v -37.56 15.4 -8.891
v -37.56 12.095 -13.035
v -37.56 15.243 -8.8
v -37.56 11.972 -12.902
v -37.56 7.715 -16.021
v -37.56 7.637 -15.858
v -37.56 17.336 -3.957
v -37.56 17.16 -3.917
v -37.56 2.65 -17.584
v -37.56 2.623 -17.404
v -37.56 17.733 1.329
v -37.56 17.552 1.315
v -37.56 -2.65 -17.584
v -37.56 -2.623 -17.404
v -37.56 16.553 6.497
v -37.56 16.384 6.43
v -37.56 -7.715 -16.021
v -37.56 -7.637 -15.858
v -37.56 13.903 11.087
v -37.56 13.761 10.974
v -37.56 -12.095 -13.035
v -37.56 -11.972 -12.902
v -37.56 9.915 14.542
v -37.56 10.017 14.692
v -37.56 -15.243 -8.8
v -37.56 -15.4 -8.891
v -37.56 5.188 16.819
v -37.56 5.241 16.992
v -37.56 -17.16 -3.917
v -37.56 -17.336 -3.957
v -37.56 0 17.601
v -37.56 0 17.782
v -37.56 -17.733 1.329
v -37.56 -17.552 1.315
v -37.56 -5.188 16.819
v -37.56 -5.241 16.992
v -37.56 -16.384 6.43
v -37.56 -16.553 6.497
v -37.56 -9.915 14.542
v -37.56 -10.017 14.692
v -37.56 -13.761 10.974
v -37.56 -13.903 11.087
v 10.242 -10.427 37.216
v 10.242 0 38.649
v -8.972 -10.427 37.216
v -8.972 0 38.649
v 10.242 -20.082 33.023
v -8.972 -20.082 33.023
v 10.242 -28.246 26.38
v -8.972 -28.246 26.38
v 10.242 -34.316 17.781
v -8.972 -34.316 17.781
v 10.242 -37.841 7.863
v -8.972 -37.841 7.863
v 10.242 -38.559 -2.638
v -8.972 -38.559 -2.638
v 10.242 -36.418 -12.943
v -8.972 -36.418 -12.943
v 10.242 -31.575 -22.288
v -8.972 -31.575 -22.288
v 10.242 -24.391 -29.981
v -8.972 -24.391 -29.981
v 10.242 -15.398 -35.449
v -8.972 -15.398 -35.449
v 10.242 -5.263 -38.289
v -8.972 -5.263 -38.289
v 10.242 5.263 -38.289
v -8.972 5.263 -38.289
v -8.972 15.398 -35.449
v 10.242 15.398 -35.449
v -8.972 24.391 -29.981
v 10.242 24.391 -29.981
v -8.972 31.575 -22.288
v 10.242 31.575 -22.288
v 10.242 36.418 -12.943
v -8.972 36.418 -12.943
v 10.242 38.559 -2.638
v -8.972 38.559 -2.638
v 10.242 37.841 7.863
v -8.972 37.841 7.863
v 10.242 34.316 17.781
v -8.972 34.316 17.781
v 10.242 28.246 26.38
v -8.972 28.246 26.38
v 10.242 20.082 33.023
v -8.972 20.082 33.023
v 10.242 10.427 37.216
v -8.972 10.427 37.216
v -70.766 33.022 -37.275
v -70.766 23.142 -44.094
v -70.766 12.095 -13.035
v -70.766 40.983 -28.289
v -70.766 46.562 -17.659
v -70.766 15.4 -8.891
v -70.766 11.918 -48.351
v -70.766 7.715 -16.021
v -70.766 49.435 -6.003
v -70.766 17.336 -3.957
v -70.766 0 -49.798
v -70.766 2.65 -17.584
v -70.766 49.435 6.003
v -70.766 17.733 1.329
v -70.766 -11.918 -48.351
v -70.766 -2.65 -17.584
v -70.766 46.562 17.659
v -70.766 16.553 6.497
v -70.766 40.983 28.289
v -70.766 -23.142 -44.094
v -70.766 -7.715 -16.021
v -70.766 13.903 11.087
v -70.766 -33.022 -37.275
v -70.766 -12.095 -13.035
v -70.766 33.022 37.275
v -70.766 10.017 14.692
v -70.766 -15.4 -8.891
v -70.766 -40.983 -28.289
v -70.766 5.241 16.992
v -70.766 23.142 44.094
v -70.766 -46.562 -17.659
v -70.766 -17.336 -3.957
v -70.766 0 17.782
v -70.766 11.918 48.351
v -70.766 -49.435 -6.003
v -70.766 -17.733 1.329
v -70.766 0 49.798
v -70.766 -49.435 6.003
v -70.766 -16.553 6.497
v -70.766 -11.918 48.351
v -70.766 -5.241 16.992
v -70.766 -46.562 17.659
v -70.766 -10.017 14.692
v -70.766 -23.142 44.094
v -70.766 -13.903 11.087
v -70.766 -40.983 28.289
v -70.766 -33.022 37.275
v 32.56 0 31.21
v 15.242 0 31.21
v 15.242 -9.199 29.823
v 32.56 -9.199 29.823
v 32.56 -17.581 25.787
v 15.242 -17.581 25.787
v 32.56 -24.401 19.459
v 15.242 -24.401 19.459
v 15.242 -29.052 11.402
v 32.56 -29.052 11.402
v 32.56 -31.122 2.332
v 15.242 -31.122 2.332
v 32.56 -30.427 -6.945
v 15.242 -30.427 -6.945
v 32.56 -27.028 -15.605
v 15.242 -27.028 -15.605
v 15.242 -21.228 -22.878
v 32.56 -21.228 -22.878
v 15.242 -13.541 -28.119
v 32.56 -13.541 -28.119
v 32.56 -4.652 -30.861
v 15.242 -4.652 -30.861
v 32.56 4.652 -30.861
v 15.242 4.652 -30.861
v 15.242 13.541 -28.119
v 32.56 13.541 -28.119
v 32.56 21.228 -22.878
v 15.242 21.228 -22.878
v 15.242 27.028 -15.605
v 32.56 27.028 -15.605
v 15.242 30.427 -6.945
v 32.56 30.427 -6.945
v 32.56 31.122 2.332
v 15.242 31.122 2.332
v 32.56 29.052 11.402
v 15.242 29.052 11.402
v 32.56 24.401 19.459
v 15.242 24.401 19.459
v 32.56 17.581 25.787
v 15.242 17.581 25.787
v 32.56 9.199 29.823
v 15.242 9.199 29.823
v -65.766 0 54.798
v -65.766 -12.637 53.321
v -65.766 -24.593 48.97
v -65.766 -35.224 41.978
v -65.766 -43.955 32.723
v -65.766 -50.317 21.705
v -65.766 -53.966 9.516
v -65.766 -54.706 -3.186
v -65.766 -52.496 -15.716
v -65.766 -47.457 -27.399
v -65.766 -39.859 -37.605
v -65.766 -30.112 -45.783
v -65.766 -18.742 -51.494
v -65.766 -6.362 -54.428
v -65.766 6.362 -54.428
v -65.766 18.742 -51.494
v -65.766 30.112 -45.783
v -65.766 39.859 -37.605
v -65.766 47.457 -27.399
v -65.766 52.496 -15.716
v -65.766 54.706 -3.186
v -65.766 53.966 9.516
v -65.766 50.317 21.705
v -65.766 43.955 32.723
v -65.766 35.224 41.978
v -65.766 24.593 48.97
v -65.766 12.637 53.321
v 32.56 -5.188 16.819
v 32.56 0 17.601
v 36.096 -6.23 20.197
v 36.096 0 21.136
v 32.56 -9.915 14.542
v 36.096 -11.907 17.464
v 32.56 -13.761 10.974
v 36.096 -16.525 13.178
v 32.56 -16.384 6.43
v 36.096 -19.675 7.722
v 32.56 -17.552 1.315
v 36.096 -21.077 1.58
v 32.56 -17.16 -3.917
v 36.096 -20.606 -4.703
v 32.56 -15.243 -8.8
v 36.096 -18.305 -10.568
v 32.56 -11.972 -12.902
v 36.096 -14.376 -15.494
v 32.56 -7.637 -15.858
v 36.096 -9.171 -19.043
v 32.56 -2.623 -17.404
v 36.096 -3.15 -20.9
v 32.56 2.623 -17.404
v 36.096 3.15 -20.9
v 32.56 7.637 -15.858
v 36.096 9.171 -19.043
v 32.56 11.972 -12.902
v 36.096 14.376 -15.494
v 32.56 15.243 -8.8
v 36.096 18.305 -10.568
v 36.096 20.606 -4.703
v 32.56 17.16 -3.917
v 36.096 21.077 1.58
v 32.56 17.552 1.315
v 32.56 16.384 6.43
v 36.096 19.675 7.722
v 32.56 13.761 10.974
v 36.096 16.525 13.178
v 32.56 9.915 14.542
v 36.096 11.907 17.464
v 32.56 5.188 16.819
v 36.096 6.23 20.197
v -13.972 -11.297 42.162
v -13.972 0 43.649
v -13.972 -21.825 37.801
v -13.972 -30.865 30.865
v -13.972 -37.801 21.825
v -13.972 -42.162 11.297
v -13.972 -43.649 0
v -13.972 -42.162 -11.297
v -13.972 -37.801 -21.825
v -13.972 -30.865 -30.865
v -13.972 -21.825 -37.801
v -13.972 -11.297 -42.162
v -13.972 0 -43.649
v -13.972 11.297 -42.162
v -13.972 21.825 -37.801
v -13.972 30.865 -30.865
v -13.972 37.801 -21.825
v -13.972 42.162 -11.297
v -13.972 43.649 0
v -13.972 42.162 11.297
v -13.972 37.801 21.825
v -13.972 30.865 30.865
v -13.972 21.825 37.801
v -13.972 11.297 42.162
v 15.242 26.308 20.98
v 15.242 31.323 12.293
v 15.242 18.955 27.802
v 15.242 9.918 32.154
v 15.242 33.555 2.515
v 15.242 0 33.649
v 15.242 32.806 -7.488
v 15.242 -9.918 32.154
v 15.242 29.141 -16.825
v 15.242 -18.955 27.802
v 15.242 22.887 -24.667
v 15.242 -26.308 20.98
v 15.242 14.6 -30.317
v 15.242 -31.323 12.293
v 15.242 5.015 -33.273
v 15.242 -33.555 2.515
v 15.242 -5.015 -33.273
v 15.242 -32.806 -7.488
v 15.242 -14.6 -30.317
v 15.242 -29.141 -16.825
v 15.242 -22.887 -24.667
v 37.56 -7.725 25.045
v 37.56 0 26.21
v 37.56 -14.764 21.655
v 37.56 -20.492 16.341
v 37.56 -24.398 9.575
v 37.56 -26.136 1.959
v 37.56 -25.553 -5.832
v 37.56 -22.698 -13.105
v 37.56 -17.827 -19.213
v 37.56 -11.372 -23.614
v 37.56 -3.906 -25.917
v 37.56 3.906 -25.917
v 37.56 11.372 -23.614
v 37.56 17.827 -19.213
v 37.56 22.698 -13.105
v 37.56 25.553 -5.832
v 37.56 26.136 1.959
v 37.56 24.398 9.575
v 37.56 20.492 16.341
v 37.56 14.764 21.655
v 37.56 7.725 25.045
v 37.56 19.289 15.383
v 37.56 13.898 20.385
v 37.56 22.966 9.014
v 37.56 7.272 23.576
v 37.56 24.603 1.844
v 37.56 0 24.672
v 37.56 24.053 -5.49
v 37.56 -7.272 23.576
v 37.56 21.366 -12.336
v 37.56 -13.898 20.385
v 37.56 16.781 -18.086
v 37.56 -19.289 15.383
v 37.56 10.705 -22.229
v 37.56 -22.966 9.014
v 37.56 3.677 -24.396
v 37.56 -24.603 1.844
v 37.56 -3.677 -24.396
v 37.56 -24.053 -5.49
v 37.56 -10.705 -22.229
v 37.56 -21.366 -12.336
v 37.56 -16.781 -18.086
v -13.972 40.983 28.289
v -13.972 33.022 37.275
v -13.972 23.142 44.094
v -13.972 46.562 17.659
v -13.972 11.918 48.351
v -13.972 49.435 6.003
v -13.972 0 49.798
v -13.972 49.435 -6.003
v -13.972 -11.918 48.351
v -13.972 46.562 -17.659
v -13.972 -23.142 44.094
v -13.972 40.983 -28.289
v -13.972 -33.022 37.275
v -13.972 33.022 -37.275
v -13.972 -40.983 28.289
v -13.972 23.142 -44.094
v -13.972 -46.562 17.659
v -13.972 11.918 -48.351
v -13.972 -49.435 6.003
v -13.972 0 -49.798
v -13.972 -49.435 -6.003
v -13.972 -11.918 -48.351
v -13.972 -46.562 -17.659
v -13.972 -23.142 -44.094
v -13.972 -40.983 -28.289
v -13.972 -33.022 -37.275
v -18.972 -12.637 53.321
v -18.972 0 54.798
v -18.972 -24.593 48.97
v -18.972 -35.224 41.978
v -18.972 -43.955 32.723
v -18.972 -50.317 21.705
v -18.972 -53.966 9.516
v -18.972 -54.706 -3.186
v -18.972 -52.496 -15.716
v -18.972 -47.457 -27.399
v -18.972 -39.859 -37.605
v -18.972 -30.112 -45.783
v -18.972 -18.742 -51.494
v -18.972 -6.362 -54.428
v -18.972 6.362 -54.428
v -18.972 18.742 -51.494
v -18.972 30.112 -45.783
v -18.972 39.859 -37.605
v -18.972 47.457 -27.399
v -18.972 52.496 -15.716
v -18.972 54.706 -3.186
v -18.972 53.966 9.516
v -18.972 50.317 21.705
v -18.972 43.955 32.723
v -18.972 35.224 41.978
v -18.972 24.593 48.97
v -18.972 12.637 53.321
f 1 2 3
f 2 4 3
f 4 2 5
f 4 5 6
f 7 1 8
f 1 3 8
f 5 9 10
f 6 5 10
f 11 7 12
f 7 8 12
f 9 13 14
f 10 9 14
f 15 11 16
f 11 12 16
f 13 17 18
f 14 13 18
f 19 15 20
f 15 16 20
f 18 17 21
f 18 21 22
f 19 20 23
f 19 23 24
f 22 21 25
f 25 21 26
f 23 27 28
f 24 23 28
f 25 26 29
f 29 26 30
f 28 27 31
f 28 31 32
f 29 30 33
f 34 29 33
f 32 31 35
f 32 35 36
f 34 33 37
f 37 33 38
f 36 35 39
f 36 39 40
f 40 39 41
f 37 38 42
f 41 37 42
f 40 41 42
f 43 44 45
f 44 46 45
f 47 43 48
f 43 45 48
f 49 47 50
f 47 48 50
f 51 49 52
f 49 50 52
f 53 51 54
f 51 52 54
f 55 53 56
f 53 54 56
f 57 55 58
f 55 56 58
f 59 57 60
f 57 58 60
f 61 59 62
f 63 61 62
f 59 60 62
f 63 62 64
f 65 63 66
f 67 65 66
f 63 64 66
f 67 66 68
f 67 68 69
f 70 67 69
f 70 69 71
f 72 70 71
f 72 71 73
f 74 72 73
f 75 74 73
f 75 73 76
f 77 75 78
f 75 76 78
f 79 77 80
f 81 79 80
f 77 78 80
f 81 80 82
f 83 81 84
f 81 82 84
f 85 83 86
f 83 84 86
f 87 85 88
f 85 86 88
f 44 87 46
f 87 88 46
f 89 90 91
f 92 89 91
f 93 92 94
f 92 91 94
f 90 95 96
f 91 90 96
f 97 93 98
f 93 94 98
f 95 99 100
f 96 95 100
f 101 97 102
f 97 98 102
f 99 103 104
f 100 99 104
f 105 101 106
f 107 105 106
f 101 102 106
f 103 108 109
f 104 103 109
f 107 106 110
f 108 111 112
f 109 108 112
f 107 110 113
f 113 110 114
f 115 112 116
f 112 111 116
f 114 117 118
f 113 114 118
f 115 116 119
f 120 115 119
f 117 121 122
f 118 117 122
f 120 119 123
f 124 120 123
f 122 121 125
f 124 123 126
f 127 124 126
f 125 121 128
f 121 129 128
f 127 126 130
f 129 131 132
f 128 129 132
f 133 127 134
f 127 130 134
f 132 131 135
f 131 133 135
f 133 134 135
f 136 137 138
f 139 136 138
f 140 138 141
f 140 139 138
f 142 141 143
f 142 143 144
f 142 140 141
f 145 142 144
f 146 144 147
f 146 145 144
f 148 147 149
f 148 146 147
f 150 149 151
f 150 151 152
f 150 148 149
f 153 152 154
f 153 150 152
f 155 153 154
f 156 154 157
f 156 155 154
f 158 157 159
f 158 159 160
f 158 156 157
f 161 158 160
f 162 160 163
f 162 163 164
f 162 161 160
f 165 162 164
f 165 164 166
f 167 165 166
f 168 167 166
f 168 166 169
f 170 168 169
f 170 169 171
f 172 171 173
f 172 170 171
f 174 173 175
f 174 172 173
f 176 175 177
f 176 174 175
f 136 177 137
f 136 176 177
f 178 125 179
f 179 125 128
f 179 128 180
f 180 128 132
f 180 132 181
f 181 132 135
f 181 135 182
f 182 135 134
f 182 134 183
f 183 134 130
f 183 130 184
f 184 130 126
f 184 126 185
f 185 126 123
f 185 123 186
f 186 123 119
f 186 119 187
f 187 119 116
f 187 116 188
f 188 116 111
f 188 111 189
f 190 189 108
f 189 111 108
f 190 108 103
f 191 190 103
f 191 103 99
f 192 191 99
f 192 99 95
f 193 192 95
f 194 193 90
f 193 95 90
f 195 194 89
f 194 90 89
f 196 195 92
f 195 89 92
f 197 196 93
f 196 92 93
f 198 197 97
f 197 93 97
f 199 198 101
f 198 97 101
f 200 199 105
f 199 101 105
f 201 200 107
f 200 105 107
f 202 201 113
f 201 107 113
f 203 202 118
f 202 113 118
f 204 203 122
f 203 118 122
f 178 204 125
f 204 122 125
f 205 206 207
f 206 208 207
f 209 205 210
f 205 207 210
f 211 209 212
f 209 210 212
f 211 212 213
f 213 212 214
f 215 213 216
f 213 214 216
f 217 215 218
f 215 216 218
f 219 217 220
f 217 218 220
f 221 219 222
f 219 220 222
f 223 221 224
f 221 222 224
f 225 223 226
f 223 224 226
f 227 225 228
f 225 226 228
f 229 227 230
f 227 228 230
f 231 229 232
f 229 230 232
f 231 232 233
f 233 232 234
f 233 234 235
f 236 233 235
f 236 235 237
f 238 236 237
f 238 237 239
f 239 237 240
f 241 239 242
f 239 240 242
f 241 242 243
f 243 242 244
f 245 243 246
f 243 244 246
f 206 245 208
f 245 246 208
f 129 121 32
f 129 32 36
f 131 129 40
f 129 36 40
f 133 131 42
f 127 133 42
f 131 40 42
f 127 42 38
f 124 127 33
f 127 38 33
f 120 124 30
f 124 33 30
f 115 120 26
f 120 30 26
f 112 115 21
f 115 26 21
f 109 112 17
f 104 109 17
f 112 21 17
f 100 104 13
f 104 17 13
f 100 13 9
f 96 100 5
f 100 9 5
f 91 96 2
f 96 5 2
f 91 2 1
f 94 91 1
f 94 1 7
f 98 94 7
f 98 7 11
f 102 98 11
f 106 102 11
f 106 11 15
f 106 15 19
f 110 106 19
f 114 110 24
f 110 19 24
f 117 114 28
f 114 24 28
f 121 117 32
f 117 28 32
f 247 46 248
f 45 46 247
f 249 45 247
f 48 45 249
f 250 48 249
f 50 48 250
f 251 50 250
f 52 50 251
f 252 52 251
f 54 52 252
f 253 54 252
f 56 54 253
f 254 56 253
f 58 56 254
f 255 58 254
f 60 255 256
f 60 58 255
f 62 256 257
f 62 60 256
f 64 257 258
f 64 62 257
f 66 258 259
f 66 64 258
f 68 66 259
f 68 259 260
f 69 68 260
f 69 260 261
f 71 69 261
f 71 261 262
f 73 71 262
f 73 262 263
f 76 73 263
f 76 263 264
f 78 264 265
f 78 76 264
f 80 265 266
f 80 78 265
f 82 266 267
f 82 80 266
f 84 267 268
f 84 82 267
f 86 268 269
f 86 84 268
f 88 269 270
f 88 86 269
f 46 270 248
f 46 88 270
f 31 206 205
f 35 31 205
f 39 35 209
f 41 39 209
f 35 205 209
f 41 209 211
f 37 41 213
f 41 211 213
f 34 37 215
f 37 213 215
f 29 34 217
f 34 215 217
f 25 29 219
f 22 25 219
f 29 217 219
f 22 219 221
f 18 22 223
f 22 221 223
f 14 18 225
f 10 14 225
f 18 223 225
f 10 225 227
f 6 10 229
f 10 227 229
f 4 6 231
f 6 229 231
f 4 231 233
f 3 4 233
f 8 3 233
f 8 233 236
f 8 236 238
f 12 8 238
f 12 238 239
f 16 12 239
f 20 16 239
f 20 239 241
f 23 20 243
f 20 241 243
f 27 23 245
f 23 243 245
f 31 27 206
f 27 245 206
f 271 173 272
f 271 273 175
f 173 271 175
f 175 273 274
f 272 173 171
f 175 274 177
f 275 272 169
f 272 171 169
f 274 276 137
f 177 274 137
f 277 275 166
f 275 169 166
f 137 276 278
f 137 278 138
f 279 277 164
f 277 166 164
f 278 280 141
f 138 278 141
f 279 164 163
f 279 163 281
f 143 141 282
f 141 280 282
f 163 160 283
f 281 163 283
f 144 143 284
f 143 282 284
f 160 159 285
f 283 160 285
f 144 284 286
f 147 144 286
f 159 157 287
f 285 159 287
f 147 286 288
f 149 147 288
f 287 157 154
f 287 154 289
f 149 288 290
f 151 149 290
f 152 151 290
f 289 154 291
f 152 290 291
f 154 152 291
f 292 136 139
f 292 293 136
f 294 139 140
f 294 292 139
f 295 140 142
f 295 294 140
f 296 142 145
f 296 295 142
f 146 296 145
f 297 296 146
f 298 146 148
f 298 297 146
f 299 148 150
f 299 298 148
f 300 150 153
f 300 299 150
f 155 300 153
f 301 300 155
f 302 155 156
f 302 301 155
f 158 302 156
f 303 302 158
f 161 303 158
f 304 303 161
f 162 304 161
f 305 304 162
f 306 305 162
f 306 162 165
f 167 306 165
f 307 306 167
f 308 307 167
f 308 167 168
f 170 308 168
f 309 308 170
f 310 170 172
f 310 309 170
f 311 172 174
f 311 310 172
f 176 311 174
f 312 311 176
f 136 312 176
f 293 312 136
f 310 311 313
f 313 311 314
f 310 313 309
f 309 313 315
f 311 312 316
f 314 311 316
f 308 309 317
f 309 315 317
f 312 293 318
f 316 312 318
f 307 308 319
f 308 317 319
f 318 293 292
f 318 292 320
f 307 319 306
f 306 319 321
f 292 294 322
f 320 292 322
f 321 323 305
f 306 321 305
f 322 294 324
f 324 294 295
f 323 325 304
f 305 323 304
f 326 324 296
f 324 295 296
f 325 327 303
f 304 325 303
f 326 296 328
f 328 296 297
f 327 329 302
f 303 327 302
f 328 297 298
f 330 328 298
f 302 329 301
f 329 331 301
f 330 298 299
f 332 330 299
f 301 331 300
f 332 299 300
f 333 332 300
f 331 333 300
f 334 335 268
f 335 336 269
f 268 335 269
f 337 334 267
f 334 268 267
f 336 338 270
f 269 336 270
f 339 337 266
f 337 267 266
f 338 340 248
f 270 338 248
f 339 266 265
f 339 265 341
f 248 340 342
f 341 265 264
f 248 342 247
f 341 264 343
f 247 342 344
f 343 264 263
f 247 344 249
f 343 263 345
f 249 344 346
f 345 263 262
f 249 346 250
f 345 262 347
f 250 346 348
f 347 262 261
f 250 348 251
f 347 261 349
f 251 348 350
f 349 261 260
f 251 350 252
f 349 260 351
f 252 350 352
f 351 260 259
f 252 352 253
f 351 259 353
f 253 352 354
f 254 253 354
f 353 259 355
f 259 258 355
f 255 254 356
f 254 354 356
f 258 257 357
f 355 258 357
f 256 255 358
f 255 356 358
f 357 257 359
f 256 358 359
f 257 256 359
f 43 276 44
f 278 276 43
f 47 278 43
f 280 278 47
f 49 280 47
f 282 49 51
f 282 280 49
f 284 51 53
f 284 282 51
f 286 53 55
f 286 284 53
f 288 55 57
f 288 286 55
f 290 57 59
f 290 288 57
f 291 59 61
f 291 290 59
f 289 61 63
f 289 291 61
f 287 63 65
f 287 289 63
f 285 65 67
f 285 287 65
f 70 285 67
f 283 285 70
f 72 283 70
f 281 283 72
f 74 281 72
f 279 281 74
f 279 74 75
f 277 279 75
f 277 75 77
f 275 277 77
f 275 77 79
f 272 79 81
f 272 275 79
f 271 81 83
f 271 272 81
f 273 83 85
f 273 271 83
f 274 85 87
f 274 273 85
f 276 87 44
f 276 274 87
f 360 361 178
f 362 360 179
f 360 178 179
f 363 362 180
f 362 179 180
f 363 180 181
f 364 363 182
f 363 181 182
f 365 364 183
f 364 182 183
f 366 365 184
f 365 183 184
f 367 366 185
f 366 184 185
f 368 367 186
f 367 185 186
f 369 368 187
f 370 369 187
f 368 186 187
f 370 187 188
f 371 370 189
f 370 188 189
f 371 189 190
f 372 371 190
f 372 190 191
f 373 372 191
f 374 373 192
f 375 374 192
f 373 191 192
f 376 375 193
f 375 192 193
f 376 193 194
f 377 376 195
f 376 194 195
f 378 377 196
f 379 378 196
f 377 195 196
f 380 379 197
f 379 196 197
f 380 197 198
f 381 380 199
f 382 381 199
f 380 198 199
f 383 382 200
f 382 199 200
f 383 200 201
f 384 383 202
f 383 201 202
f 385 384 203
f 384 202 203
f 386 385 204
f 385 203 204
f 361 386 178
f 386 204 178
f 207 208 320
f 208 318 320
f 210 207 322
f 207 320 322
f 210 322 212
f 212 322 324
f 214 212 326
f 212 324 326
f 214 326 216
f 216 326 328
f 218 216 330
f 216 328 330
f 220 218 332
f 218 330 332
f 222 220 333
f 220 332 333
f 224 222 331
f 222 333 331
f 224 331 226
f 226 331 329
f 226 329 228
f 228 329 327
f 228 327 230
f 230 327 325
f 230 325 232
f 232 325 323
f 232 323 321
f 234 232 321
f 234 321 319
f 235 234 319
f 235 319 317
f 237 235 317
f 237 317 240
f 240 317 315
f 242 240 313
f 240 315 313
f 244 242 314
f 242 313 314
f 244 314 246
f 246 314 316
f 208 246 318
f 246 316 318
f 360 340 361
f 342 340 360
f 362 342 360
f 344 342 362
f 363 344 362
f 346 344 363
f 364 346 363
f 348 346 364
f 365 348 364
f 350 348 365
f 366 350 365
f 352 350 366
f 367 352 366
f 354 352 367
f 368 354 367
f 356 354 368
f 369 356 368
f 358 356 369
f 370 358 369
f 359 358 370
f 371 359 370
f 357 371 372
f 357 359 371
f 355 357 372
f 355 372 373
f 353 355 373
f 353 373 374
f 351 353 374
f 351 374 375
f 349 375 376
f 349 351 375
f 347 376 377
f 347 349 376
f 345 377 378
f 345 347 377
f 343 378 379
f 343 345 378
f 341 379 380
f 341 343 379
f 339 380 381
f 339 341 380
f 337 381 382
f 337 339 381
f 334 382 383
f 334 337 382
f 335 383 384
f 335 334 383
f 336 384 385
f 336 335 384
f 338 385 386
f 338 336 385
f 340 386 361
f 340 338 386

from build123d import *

# Parameters (mm, degrees)
F1_W    = 23.5887104645
F1_H    = 20.866939798
F1_W_2  = 22.3185494542
F1_H_2  = 13.6088710278
F1_W_3  = 19.2338721827
F3_SIZE = 5


# Not quite as in the source:
# - a fillet or chamfer that OpenCascade refuses, or shapes differently, is made with other operations: its cross-section is extruded or revolved along the edge and cut away or added


with BuildPart() as f2:
    # F1 (on Front) → F2 (revolve)
    with BuildSketch(Plane.XZ):
        Polygon((-13.9717748389, 54.798386991), (-70.7661360502, 54.798386991), (-70.7661360502, 17.7822578698), (-37.5604853034, 17.7822578698), (-37.5604853034, 38.6491976678), (-13.9717748389, 38.6491976678), align=None)
        Polygon((15.2419358492, 38.6491976678), (-13.9717748389, 38.6491976678), (-13.9717748389, 17.7822578698), (-37.5604853034, 17.7822578698), (-37.5604853034, 17.6008082926), (-3.9919363335, 17.6008082926), (-3.9919363335, 31.2096793205), (15.2419358492, 31.2096793205), align=None)
        with Locations((-25.7661300711, 28.2157277688)):
            Rectangle(F1_W, F1_H)
        with Locations((26.4012105763, 24.4052438065)):
            Rectangle(F1_W_2, F1_H_2)
        with Locations((5.6249997579, 24.4052438065)):
            Rectangle(F1_W_3, F1_H_2)
    revolve(axis=Axis((0.2721734345, 0, 0), (1, 0, 0)))

    # F3
    f3_edges = [f2.edges().sort_by_distance(p)[0] for p in [
        (-13.971775, 0, -54.798387),
        (-70.766136, 0, -54.798387),
        (-42.368955, 0, 54.798387),
        (37.560485, 0, -17.600808),
    ]]
    chamfer(f3_edges, length=F3_SIZE)

    # F4: chamfer of 5 on 5 edges, made by hand

    # F4_s1 → F4_t2 (revolve)
    with BuildSketch(Plane.XZ):
        Polygon((-13.9717748389, 43.6491976678), (-8.9717748389, 38.6491976678), (-13.9717748389, 38.6491976678), align=None)
    revolve(axis=Axis((-13.9717748389, 0, 0), (1, 0, 0)))

    # F4_s3 → F4_t4 (revolve, cut)
    with BuildSketch(Plane.XZ):
        Polygon((32.5604853034, 31.2096793205), (37.5604853034, 26.2096793205), (37.5604853034, 31.2096793205), align=None)
    revolve(axis=Axis((37.5604853034, 0, 0), (1, 0, 0)), mode=Mode.SUBTRACT)

    # F4_s5 → F4_t6 (revolve, cut)
    with BuildSketch(Plane.XZ):
        Polygon((36.0960192093, 21.1363421986), (37.5604853034, 24.6718761045), (37.5604853034, 22.6008082926), align=None)
    revolve(axis=Axis((37.5604853034, 0, 0), (1, 0, 0)), mode=Mode.SUBTRACT)

    # F4_s7 → F4_t8 (revolve, cut)
    with BuildSketch(Plane.XZ):
        Polygon((10.2419358492, 38.6491976678), (15.2419358492, 33.6491976678), (15.2419358492, 38.6491976678), align=None)
    revolve(axis=Axis((15.2419358492, 0, 0), (1, 0, 0)), mode=Mode.SUBTRACT)


solid = f2.part
